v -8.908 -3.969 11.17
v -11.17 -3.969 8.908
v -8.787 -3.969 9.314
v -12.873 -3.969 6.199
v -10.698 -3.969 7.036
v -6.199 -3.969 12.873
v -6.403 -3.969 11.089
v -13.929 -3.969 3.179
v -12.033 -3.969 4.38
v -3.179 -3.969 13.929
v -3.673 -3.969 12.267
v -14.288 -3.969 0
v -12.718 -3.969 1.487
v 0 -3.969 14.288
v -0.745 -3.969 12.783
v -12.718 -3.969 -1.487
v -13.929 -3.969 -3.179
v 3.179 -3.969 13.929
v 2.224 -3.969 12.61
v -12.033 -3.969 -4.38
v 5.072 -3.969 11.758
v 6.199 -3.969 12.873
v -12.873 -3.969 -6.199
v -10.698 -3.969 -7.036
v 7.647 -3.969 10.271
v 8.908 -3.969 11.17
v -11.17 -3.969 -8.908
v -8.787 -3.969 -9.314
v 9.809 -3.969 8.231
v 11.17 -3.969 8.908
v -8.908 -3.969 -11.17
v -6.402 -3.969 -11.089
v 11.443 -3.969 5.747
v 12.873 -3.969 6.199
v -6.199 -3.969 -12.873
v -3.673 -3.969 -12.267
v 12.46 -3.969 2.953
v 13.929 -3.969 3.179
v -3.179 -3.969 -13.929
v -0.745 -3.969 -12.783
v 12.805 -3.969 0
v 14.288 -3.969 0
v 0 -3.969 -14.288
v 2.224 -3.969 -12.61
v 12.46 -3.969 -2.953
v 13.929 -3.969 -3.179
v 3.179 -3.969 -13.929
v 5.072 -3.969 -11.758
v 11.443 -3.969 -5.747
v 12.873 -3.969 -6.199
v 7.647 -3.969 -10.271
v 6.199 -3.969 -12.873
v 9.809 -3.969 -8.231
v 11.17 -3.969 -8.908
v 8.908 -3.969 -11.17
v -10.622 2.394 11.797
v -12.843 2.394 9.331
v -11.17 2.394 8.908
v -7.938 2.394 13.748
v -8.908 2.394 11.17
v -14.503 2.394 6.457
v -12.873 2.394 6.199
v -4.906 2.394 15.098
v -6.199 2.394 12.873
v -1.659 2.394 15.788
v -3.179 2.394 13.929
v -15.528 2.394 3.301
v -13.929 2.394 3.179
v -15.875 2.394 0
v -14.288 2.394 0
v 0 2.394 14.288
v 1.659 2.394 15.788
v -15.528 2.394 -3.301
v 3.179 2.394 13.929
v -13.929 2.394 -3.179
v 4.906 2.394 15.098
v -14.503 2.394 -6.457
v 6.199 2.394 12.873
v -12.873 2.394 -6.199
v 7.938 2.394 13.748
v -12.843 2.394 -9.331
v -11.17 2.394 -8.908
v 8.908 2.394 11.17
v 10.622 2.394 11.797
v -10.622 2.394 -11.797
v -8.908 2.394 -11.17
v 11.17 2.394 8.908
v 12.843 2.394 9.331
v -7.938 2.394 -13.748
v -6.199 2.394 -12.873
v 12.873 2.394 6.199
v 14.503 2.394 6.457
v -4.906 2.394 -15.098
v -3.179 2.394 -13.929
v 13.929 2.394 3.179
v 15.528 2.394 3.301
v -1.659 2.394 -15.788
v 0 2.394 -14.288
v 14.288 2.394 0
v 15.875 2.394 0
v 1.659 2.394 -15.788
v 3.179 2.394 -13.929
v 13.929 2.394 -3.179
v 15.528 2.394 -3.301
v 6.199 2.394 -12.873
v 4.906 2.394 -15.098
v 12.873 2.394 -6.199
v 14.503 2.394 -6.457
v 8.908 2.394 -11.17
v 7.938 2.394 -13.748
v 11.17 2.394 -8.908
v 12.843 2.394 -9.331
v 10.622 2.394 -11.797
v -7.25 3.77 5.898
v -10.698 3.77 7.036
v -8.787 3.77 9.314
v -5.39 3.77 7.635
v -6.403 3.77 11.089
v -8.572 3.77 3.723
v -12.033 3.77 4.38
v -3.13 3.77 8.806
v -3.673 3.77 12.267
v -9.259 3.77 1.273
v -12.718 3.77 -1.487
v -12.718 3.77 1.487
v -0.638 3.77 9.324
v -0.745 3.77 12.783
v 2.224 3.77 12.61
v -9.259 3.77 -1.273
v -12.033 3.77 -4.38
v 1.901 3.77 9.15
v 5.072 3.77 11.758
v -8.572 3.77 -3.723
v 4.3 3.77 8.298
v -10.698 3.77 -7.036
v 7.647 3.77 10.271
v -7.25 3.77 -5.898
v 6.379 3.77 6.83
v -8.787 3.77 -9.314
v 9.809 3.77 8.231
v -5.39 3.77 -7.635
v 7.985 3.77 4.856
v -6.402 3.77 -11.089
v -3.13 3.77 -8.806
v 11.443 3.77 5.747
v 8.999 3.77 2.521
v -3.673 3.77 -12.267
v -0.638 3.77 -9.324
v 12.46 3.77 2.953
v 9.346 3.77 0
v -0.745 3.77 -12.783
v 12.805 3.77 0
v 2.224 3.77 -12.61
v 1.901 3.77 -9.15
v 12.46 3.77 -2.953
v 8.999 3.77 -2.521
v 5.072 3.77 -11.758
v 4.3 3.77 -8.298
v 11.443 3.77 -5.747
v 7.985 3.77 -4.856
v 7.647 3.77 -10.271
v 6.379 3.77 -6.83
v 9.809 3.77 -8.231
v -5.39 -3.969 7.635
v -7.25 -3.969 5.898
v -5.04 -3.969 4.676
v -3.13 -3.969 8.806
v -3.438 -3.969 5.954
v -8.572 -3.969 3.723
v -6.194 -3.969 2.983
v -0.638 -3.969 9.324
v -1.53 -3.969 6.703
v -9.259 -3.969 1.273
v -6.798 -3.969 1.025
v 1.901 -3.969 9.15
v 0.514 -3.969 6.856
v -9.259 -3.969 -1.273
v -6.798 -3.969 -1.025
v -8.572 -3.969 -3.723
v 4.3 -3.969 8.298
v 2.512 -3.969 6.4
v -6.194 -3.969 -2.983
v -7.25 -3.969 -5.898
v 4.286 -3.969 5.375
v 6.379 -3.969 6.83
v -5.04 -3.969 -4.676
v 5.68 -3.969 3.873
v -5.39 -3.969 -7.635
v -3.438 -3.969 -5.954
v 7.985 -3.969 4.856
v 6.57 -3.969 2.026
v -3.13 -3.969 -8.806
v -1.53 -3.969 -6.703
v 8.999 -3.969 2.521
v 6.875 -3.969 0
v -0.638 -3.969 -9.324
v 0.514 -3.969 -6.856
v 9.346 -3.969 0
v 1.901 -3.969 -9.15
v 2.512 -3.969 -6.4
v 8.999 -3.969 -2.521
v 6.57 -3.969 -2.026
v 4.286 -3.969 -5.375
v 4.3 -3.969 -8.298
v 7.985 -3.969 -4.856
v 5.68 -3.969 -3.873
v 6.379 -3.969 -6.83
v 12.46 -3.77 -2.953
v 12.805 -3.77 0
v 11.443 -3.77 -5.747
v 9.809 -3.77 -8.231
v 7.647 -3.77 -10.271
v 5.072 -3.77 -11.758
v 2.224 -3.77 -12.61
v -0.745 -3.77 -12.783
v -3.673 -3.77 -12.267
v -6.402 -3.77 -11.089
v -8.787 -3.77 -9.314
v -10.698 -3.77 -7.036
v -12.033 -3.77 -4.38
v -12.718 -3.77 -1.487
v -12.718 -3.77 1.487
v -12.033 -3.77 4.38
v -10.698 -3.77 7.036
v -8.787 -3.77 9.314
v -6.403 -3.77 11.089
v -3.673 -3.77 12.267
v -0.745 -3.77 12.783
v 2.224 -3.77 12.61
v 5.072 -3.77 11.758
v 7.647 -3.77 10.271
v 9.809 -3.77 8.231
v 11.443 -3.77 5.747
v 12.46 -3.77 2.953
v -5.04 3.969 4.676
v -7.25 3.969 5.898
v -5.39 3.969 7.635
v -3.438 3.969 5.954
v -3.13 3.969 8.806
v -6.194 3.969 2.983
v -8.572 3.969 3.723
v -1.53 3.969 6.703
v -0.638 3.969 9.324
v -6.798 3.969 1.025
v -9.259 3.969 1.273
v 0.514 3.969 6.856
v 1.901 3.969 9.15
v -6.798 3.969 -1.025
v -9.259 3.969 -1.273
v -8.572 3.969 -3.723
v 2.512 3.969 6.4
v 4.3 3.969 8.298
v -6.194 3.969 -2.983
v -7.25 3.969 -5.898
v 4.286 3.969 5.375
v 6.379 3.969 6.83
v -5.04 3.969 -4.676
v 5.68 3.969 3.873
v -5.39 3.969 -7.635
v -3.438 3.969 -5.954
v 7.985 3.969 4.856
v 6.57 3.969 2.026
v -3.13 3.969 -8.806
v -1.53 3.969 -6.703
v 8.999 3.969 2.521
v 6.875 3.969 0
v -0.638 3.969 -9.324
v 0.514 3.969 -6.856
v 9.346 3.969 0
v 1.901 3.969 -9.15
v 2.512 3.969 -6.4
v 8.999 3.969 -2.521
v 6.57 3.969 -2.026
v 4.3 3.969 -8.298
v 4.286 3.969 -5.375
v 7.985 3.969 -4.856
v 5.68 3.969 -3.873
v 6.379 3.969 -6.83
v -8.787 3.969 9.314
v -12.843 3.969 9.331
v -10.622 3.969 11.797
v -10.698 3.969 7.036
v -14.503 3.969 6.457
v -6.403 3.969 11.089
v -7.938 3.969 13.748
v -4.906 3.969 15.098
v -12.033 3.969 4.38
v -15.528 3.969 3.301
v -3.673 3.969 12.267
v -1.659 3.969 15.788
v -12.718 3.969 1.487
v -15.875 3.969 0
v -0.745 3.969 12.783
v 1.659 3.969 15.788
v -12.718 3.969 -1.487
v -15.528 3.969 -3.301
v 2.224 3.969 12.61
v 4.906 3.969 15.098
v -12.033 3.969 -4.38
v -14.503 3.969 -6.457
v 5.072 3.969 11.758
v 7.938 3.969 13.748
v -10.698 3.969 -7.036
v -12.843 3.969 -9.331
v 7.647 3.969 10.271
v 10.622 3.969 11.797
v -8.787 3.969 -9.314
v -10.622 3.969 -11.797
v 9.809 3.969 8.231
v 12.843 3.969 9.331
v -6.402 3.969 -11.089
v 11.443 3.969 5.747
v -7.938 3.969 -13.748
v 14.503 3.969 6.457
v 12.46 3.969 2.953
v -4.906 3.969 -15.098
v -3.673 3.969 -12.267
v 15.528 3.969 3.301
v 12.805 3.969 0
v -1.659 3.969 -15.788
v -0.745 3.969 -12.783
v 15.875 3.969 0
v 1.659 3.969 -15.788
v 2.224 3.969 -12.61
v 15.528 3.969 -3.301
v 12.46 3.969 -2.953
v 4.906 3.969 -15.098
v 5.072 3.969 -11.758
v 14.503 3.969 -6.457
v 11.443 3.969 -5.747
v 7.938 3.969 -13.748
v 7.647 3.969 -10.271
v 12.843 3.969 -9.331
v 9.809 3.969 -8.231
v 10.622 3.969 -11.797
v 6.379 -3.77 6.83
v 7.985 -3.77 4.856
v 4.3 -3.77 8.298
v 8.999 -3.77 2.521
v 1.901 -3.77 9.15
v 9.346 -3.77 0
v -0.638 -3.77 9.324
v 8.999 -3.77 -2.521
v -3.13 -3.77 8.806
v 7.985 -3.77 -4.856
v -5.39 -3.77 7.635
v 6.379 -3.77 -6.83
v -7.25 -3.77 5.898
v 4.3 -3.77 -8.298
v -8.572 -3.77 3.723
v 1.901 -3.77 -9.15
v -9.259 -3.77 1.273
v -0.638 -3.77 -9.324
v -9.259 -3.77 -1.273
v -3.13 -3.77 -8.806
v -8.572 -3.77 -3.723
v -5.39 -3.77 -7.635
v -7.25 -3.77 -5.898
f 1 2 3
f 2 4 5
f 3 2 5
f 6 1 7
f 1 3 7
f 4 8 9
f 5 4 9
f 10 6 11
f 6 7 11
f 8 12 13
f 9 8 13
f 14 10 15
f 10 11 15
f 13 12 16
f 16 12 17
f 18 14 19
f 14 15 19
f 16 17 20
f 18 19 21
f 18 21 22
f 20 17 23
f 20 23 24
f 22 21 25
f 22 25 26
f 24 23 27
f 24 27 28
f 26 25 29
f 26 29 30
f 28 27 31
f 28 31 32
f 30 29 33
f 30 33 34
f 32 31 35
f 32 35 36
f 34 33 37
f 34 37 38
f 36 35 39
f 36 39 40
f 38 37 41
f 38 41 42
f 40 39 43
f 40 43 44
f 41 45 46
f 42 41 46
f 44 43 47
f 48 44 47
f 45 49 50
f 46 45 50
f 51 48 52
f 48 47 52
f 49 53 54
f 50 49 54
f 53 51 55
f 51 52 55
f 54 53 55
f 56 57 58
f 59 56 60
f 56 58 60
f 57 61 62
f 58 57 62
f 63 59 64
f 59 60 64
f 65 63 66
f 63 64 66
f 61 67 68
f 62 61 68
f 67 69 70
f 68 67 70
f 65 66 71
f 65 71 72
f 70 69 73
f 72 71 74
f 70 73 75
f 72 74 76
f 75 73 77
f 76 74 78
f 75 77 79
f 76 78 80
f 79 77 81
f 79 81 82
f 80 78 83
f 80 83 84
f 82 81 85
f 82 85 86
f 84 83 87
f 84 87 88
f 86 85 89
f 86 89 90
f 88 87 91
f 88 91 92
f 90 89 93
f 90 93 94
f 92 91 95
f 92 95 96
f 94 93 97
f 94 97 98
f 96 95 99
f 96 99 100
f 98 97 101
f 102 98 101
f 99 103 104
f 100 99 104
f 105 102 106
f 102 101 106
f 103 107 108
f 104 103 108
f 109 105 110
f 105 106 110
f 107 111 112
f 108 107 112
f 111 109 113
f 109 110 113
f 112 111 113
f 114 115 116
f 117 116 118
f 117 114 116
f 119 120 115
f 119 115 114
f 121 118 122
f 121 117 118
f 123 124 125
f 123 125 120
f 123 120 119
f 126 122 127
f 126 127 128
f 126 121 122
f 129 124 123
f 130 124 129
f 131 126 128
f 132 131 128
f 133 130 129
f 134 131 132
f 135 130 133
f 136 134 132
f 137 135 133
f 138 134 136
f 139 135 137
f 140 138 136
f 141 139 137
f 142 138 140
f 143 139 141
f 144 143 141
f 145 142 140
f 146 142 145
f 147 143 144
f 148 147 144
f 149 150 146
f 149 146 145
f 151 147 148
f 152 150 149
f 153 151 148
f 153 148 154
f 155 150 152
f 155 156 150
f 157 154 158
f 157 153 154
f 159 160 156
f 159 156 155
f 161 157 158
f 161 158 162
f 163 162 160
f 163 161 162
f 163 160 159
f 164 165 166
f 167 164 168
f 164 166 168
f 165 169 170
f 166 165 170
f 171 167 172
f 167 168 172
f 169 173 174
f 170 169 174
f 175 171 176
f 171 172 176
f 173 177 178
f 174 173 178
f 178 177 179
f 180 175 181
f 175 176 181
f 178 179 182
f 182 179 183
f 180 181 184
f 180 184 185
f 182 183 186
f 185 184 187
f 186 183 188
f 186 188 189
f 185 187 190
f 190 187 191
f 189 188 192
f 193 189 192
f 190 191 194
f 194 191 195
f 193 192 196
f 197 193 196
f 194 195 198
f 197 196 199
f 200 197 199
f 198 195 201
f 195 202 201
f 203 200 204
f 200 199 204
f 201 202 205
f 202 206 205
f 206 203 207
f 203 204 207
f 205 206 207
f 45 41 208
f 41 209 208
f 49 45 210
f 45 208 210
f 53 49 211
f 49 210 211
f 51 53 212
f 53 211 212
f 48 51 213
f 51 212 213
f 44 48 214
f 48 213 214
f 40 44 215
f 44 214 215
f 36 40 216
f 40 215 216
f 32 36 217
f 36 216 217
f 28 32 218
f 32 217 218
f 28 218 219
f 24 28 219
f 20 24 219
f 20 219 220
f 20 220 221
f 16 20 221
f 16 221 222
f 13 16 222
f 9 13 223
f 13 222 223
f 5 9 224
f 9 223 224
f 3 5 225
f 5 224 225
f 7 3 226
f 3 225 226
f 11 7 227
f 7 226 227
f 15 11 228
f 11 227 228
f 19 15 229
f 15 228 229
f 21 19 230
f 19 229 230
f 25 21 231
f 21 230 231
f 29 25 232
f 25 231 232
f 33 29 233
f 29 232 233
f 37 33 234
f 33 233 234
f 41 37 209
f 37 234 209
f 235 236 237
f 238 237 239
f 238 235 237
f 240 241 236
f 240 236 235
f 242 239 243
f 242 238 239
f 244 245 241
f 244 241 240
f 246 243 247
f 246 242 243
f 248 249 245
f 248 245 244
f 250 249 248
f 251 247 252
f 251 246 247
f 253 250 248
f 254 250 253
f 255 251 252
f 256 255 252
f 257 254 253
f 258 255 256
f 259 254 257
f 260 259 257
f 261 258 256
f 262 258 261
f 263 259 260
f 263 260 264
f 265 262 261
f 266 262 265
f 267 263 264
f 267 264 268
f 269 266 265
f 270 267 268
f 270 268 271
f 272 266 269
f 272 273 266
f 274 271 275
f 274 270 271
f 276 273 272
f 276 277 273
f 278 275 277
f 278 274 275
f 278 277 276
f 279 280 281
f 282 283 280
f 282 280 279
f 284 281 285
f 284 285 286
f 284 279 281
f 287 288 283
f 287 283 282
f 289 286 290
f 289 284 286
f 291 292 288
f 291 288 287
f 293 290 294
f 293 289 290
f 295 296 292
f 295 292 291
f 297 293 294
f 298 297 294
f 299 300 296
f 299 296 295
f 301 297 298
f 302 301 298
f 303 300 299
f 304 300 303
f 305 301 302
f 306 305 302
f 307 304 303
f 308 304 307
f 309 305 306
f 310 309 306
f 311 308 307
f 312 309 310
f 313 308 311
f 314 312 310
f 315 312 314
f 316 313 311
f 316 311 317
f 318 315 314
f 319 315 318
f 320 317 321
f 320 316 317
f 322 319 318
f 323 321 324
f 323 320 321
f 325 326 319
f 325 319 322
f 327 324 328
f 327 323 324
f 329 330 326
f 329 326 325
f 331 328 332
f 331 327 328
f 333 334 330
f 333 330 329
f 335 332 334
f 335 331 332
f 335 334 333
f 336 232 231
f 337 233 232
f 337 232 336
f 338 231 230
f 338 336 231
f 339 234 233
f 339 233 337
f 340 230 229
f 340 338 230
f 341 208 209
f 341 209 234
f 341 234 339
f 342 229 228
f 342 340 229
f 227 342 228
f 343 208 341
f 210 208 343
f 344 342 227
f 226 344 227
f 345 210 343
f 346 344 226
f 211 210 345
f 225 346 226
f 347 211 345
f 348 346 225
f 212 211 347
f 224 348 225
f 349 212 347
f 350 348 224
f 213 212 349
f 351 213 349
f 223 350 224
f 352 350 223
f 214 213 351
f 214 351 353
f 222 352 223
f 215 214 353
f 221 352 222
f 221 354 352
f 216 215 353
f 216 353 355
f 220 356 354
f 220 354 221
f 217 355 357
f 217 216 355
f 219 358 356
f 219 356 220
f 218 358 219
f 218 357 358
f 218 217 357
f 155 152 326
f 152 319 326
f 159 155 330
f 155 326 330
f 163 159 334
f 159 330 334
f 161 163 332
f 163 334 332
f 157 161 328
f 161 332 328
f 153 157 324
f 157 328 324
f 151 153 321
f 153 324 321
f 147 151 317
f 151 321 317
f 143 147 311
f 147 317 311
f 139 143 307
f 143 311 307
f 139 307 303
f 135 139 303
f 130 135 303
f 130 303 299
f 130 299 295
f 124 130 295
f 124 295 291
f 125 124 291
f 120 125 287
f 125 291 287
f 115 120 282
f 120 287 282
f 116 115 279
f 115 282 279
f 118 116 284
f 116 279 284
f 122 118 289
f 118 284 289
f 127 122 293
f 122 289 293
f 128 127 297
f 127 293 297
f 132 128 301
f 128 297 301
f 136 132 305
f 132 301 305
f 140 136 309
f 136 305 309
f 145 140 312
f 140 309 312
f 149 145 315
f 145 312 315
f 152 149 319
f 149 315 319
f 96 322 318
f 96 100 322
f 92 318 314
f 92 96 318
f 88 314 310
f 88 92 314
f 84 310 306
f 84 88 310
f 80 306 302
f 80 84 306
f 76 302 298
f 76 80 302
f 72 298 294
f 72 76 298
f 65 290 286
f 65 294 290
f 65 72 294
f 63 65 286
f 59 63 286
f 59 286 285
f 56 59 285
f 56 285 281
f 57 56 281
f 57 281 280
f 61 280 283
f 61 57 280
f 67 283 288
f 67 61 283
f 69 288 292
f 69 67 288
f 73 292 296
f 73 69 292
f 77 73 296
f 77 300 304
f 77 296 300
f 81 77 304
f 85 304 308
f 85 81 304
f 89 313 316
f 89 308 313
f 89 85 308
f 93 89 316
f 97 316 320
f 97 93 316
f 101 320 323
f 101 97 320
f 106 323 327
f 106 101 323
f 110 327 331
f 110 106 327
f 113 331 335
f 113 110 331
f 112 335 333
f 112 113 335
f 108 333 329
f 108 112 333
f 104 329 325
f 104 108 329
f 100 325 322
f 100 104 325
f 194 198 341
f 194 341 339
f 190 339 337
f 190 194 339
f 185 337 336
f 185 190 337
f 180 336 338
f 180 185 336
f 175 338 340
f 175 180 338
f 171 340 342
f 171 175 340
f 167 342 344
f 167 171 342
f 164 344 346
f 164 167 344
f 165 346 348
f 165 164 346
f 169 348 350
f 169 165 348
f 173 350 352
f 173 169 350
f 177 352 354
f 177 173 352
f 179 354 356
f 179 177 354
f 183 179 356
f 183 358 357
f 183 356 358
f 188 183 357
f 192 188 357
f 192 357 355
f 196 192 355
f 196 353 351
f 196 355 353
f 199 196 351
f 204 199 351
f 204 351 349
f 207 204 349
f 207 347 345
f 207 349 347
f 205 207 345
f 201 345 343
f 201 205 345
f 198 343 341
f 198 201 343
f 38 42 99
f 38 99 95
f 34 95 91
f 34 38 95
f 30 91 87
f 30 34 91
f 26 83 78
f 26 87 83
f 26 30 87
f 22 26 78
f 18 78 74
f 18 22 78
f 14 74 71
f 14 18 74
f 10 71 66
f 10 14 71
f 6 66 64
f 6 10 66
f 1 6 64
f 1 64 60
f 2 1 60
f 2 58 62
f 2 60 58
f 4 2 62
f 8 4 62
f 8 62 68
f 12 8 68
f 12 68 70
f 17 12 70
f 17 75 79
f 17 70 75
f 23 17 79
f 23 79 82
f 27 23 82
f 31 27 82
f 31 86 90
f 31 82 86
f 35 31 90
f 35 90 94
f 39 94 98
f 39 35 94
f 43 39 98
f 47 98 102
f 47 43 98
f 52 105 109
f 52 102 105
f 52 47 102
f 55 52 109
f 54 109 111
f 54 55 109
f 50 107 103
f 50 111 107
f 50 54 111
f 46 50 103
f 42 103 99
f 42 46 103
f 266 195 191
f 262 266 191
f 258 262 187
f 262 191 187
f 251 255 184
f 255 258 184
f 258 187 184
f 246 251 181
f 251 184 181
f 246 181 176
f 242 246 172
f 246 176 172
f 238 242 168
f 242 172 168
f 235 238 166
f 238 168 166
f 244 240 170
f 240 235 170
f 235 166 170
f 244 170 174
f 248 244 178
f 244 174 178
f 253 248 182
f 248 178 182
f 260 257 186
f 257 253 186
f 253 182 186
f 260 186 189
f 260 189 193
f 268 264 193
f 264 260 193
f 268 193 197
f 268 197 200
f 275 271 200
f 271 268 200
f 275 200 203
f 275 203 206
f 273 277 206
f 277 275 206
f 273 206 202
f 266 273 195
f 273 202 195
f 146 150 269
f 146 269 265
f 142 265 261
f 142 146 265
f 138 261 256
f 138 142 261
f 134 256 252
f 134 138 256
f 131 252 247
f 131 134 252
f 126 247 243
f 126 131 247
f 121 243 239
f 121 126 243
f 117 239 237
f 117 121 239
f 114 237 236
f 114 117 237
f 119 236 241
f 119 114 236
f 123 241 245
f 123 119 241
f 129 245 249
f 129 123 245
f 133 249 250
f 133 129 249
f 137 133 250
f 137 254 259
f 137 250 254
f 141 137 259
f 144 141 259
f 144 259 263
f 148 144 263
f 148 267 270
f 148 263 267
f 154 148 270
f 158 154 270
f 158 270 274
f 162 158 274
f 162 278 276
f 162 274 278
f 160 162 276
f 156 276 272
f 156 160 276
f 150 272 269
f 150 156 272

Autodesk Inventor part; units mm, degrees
ref_plane "YZ Plane" through (0, 0, 0) normal (1, 0, 0) x (0, 1, 0)
ref_plane "XZ Plane" through (0, 0, 0) normal (0, 1, 0) x (-1, 0, 0)
ref_plane "XY Plane" through (0, 0, 0) normal (0, 0, 1) x (1, 0, 0)
sketch "Sketch15" plane through (0, 0, 0) normal (0, 0, 1) x (1, 0, 0)
  line L0 (0, 0) -> (0, 6.6558) construction
  line L1 (0, 0) -> (6.875, 3.9688) construction
  line L2 (6.875, 3.9688) -> (6.875, -3.9688)
  line L3 (6.875, -3.9688) -> (0, 0) construction
  line L4 (6.875, 3.9688) -> (9.3458, 3.9688)
  line L5 (9.3458, 3.9688) -> (9.3458, 3.6433)
  line L6 (9.3458, 3.6433) -> (12.805, 3.6433)
  line L7 (12.805, 3.6433) -> (12.805, 3.9688)
  line L8 (12.805, 3.9688) -> (15.875, 3.9688)
  line L9 (15.875, 3.9688) -> (15.875, 2.3939)
  line L10 (15.875, 2.3939) -> (14.2875, 2.3939)
  line L11 (14.2875, 2.3939) -> (14.2875, -3.9688)
  line L12 (14.2875, -3.9688) -> (12.805, -3.9688)
  line L13 (12.805, -3.9688) -> (12.805, -3.6433)
  line L14 (12.805, -3.6433) -> (9.3458, -3.6433)
  line L15 (9.3458, -3.6433) -> (9.3458, -3.9688)
  line L16 (9.3458, -3.9688) -> (6.875, -3.9688)
  dimension "FlangeOD" = 31.75
  dimension "FlangeThickness" = 1.5748
  dimension "BearingID" = 13.75
  dimension "BearingOD" = 28.575
  dimension "d177" = 7.2866
  dimension "BearingThickness" = 7.9375
  dimension "d179" = 2.4708
  dimension "d180" = 1.4825
  dimension "d181" = 7.4125
revolve "Revolution1" add sketch "Sketch15" angle 360 about axis through (0, 0, 0) along (0, 1, 0)
sketch "Sketch17" plane through (0, 3.9687, 0) normal (0, 1, 0) x (1, 0, 0)
  circle A0 centre (0, 0) radius 6.875 projected
  line L0 (-7.9386, 0) -> (-3.9693, 6.875)
  line L1 (-3.9693, 6.875) -> (3.9693, 6.875)
  line L2 (3.9693, 6.875) -> (7.9386, 0)
  line L3 (7.9386, 0) -> (3.9693, -6.875)
  line L4 (3.9693, -6.875) -> (-3.9693, -6.875)
  line L5 (-3.9693, -6.875) -> (-7.9386, 0)
  point P0 (0, 0)
extrude "Hex" [suppressed]
sketch "Sketch16" plane through (0, 3.6433, 0) normal (0, 1, 0) x (1, 0, 0)
  circle A0 centre (0, 0) radius 9.3458 projected
  circle A1 centre (0, 0) radius 12.805 projected
extrude "Shielded" add sketch "Sketch16" along normal blind 0.127
mirror "Shielded Mirror" about plane through (0, 0, 0) normal (0, 1, 0) of "Shielded"
sketch "Sketch18" plane through (0, 3.6433, 0) normal (0, 1, 0) x (1, 0, 0)
  circle A0 centre (0, 0) radius 2.6458 projected
  circle A1 centre (0, 0) radius 4.1275 projected
extrude "Sealed" [suppressed]
mirror "Sealed Mirror" [suppressed]
equation "\"pi\" = 3.141593"
properties part number "217-4006" material "Steel"
